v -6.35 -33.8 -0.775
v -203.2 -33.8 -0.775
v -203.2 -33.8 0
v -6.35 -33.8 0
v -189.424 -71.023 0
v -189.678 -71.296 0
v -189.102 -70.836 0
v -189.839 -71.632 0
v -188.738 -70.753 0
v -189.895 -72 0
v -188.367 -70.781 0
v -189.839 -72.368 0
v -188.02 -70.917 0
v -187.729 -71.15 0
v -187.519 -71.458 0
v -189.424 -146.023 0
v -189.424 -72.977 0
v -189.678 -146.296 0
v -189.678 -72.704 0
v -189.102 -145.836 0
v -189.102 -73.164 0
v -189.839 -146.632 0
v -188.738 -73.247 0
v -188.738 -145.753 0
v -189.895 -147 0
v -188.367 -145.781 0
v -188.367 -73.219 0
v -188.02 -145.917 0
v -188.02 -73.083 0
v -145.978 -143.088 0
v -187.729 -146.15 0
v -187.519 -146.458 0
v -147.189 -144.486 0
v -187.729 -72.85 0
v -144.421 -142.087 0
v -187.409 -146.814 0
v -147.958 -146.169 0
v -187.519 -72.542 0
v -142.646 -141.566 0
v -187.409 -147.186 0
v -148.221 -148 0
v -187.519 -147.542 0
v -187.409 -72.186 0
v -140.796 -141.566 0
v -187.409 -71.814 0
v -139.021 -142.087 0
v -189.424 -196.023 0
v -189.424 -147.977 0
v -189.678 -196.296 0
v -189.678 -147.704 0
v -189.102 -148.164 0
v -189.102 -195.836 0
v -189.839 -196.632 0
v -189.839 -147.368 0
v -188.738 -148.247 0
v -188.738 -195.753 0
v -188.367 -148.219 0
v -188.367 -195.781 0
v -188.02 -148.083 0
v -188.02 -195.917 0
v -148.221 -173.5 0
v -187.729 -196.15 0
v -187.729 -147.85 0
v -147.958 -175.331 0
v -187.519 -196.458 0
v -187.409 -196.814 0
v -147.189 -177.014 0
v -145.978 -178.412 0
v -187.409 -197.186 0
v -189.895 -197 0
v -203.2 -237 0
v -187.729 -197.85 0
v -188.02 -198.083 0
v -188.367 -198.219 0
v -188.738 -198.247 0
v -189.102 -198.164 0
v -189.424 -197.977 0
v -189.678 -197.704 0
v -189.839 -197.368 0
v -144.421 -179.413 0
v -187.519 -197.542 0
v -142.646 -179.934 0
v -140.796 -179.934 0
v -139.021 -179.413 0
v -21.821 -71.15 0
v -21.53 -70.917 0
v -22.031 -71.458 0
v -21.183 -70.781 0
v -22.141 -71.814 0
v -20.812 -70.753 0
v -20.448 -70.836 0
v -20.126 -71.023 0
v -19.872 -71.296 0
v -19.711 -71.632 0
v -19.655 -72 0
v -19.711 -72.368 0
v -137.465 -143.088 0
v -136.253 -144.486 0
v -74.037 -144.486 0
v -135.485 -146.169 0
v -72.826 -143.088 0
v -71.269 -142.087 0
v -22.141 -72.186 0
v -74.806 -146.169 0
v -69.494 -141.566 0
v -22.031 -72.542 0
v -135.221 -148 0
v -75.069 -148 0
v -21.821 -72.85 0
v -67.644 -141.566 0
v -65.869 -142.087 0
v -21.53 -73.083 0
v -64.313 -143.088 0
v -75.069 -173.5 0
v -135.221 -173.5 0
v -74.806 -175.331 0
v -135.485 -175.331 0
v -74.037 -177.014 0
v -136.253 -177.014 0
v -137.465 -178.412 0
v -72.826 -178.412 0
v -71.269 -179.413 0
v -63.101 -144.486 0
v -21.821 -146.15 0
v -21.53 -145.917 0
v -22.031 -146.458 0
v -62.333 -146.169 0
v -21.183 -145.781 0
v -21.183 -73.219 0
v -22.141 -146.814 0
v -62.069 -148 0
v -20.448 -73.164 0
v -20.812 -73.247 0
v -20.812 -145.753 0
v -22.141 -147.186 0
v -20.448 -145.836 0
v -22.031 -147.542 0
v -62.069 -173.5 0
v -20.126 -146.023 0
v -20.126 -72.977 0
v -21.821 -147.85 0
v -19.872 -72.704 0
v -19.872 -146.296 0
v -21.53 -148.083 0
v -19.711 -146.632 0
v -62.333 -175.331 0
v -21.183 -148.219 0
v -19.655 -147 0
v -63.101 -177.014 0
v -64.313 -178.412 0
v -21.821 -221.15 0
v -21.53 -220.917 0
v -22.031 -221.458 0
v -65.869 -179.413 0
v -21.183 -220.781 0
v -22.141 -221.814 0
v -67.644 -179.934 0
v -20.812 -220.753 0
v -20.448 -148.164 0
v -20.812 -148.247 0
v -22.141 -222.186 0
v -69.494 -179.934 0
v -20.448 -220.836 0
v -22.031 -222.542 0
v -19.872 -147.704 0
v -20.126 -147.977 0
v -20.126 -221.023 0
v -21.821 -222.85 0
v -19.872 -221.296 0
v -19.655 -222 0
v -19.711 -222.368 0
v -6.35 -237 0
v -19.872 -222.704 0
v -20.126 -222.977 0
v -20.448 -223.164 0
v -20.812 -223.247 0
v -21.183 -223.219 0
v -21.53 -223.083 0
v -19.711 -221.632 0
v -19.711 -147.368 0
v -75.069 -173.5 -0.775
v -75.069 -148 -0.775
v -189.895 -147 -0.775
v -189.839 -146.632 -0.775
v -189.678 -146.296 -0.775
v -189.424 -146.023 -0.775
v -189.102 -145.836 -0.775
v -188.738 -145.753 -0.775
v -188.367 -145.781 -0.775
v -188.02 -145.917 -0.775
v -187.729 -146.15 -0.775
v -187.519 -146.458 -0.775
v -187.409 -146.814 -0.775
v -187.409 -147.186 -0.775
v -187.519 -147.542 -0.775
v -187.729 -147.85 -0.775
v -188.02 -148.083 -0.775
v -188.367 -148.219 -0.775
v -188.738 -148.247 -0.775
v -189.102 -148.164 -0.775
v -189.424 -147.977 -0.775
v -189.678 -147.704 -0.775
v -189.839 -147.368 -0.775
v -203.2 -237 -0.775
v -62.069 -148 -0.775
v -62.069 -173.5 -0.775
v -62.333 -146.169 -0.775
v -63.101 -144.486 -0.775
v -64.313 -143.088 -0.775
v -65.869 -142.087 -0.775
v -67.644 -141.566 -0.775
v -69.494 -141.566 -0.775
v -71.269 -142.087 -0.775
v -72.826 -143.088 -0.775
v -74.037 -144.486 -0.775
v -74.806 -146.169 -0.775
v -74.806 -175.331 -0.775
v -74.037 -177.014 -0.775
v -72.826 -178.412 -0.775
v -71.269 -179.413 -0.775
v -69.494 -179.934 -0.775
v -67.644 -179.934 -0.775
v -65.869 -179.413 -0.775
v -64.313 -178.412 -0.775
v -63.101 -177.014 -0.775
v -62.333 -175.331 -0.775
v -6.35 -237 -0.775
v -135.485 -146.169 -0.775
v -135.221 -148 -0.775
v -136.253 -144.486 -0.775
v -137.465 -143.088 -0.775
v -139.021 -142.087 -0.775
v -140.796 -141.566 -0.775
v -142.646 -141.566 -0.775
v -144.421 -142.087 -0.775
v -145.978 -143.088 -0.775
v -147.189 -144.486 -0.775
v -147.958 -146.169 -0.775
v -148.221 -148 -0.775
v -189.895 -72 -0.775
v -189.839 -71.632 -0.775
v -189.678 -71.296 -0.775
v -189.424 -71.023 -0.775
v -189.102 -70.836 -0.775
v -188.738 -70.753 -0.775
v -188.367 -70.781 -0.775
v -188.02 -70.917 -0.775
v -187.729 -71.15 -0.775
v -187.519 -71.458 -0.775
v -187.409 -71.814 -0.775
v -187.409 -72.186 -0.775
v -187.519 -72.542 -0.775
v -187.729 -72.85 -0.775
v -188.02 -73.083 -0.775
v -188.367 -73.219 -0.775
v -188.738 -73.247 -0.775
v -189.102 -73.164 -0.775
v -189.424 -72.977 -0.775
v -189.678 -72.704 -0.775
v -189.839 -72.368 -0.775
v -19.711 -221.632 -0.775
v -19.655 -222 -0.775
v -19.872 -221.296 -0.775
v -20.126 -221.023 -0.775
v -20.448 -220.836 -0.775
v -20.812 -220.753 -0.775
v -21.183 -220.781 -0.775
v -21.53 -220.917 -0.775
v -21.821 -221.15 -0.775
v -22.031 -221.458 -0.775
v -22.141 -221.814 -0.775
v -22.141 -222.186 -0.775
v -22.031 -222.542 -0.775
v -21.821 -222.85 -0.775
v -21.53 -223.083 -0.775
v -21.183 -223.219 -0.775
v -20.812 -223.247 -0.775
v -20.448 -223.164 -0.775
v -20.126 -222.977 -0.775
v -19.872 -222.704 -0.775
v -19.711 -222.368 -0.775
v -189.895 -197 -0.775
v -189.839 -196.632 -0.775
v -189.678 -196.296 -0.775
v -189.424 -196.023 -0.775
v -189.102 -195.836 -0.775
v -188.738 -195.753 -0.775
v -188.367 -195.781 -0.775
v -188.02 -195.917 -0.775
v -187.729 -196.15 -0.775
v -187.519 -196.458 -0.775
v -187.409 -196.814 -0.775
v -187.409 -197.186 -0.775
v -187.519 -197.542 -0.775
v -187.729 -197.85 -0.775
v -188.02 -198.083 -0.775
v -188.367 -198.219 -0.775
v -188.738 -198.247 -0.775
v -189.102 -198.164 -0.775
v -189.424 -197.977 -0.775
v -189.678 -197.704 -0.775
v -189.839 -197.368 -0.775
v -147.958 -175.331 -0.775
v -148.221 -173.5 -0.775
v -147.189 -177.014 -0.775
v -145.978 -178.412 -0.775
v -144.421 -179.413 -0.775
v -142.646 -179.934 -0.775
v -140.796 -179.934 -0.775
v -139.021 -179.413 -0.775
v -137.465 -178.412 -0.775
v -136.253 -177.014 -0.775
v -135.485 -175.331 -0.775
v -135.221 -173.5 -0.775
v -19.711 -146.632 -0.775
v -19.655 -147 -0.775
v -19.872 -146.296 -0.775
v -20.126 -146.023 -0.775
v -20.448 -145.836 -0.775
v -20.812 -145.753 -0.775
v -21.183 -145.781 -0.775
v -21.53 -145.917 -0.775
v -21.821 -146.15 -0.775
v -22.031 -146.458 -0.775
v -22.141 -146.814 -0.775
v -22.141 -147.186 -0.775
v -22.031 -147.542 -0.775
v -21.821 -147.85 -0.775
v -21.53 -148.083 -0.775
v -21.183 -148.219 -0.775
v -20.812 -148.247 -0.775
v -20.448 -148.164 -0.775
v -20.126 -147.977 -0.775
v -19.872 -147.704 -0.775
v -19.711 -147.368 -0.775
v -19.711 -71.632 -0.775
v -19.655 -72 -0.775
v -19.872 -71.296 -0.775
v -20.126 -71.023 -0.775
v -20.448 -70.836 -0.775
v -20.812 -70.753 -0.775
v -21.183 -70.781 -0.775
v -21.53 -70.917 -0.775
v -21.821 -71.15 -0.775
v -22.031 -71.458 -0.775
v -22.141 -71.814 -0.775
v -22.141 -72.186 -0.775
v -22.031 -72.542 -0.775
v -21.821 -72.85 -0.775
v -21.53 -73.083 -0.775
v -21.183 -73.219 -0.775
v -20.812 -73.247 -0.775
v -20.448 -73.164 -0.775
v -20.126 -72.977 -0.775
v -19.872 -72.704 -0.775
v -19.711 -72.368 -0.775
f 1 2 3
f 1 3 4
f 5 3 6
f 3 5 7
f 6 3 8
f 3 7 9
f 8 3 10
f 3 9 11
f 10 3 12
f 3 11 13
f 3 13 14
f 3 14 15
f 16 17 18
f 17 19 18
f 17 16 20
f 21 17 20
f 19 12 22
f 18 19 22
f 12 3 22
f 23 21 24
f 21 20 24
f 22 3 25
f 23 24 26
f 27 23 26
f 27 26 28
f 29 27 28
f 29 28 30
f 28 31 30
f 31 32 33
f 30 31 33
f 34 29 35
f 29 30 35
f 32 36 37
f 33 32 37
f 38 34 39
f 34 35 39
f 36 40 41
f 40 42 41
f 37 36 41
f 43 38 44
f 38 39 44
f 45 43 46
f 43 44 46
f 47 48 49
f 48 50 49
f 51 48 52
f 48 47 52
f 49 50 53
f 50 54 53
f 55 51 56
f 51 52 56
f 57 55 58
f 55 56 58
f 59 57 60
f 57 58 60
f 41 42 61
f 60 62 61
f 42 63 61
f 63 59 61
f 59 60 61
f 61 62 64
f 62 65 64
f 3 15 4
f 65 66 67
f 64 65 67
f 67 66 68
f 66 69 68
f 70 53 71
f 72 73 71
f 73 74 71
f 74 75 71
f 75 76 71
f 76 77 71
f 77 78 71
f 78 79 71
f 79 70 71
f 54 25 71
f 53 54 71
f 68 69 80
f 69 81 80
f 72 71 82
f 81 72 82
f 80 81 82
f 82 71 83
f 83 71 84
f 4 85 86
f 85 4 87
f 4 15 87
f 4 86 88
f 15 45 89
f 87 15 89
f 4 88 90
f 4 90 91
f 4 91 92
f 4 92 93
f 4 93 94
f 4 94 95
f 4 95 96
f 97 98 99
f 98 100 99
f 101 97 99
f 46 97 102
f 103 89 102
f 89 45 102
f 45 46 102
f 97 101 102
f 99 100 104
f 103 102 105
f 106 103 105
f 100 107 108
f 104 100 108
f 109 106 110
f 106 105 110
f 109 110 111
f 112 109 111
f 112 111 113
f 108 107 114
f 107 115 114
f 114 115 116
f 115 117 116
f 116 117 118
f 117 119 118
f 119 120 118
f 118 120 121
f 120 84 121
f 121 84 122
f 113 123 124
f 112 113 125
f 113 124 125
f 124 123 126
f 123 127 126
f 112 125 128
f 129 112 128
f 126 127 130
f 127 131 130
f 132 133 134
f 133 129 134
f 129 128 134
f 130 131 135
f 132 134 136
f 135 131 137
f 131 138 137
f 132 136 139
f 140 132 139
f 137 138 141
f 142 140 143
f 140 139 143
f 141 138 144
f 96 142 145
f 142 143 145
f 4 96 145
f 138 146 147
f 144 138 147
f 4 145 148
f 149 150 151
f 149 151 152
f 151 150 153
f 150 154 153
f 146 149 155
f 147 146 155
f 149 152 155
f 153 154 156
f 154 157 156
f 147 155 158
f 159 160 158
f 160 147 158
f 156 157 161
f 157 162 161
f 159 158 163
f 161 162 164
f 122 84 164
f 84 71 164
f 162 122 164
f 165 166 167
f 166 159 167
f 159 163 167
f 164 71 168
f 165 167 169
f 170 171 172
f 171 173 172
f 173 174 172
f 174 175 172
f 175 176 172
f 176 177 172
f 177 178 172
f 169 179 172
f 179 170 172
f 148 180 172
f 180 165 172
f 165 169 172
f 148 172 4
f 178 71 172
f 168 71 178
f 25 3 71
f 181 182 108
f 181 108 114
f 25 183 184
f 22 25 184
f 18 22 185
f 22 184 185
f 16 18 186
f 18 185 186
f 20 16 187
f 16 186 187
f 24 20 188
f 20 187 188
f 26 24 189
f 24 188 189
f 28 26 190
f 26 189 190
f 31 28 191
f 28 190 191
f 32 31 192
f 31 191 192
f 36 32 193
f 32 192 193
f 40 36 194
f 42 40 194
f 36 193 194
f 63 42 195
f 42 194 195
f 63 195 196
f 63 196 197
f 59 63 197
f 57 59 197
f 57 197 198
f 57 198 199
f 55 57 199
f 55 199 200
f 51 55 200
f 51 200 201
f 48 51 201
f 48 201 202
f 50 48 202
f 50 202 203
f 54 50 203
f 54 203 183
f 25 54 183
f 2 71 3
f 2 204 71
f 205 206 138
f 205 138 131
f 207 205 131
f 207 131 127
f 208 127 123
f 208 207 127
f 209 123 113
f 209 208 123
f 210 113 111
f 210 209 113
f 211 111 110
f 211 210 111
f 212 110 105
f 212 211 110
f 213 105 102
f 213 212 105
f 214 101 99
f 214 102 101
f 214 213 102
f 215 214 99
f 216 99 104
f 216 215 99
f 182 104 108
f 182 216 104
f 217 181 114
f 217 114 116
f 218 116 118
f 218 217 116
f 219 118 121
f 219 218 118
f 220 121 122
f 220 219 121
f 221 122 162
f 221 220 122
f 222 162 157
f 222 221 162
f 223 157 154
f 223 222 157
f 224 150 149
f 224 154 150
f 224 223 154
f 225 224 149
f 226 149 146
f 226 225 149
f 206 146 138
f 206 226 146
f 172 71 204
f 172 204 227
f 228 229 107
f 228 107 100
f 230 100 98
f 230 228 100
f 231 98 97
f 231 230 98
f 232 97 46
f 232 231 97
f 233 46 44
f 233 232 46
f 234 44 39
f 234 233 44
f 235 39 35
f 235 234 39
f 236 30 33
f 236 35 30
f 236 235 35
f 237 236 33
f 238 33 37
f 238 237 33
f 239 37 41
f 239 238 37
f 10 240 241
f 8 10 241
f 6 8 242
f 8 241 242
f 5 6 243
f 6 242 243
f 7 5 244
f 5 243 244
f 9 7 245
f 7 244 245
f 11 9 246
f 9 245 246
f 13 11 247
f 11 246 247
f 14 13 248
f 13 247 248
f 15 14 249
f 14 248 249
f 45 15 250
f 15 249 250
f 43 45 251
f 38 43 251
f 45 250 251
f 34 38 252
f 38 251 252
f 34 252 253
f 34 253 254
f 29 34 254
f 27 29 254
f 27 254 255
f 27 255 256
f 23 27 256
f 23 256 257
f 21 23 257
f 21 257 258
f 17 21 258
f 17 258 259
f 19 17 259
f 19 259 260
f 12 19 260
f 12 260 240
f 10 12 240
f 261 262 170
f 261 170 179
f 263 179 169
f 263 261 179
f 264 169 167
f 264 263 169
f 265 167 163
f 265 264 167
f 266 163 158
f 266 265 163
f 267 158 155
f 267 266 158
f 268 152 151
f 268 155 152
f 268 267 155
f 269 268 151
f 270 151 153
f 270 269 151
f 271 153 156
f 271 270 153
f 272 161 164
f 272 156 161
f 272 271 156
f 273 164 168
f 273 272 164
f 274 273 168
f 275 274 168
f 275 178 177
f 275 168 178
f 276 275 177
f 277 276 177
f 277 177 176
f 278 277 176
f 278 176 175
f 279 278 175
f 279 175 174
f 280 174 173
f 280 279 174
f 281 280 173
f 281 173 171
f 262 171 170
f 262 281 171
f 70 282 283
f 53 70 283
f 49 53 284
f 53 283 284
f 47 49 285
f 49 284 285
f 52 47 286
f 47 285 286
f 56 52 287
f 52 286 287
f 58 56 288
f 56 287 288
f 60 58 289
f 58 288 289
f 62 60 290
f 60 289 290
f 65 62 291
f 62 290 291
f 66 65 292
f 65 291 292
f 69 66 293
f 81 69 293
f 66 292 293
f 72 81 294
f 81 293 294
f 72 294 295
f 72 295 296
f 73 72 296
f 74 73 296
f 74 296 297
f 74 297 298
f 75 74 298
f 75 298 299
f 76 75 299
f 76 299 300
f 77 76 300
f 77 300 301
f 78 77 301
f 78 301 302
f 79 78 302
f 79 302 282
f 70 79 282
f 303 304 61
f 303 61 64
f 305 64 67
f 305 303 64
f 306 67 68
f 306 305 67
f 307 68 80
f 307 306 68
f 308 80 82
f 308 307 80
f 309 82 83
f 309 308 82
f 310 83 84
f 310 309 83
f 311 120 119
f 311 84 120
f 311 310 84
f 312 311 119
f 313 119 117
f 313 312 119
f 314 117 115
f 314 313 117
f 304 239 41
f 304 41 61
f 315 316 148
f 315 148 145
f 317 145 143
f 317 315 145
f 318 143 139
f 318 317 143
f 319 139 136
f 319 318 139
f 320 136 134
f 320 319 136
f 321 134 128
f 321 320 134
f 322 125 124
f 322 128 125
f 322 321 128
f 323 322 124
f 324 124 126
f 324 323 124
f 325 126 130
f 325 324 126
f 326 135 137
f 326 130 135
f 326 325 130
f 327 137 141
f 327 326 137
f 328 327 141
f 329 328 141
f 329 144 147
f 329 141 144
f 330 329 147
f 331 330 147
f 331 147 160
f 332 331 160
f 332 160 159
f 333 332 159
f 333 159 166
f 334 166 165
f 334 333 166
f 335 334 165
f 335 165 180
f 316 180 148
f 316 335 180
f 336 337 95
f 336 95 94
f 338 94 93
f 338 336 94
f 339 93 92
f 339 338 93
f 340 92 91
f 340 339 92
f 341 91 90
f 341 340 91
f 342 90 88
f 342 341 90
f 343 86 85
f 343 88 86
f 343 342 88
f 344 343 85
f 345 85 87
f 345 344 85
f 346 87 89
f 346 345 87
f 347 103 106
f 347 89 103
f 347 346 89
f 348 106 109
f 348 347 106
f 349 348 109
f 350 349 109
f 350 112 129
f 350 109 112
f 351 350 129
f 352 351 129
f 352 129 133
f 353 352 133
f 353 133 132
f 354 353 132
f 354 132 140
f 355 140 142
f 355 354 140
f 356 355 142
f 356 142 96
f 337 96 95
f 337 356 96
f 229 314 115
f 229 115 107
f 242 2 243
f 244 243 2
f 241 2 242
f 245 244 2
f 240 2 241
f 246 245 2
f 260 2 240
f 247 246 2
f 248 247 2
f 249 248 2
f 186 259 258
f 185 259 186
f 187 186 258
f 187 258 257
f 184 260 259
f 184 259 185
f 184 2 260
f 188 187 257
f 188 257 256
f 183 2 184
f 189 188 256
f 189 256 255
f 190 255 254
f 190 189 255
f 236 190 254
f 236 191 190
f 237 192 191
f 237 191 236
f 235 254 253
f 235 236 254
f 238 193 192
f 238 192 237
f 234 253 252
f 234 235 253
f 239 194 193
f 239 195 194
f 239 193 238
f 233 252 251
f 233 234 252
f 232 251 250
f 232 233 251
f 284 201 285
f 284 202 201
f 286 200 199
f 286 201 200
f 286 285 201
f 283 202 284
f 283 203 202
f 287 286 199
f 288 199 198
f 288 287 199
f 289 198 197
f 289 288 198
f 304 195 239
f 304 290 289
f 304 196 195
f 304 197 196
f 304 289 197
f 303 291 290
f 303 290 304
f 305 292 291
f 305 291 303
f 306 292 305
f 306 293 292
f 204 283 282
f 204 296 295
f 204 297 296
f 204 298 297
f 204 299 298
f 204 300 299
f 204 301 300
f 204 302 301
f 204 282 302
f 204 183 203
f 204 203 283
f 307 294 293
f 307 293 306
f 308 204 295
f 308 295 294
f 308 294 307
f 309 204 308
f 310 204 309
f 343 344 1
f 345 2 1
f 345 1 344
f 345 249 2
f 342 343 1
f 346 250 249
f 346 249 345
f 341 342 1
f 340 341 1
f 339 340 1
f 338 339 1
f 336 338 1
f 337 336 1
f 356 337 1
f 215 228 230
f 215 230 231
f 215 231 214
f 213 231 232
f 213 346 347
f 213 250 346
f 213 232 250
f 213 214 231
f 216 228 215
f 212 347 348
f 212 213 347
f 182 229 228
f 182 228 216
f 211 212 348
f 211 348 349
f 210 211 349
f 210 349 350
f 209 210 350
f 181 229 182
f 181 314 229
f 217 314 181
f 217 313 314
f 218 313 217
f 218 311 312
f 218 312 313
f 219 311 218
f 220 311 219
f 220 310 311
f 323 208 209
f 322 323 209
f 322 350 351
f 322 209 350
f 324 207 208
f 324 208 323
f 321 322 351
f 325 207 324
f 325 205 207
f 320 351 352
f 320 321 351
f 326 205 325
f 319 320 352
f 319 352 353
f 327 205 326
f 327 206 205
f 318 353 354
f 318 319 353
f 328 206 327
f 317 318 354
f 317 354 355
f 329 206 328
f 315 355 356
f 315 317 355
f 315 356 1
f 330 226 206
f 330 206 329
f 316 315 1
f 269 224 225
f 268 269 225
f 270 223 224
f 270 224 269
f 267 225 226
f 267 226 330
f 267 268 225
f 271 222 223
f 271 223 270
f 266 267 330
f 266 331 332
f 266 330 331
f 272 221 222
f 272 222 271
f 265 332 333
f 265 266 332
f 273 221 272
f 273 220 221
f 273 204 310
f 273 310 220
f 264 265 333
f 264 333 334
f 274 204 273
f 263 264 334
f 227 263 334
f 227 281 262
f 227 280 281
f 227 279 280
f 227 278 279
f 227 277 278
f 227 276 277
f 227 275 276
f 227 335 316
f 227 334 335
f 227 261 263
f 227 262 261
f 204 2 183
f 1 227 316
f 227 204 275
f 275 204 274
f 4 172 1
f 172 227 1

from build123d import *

# Parameters (mm, degrees)
SKETCH1_W                             = 196.85
SKETCH1_H                             = 203.2
BOSS_EXTRUDE1_DEPTH                   = 0.7747
CUT_EXTRUDE7_DEPTH                    = 1.7747
SKETCH4_W                             = 196.85
SKETCH4_H                             = 0.6096
BOSS_EXTRUDE2_DEPTH                   = 12
SKETCH14_W                            = 196.85
SKETCH14_H                            = 11.938
BOSS_EXTRUDE3_DEPTH                   = 0.7747
SKETCH13_W                            = 196.85
SKETCH13_H                            = 0.6096
CUT_EXTRUDE9_DEPTH                    = 12
CSK_FOR_M3_FLAT_HEAD_MACHINE_SCREW3_D = 2.5
SKETCH19_W                            = 182.676330849
SKETCH19_H                            = 33.741187375
BOSS_EXTRUDE4_DEPTH                   = 0.7747
SKETCH21_W                            = 22.718000829
SKETCH21_H                            = 22.312299049
SKETCH21_W_2                          = 21.538835619
SKETCH21_H_2                          = 16.643270878
BOSS_EXTRUDE5_DEPTH                   = 0.7747
SKETCH22_W                            = 13.90531837
SKETCH22_H                            = 14.215216999
SKETCH22_W_2                          = 12.509578485
SKETCH22_H_2                          = 9.075576548
BOSS_EXTRUDE6_DEPTH                   = 0.7747


with BuildPart() as part:
    # Sketch1 → Boss-Extrude1 (new body)
    with BuildSketch(Plane(origin=(0, 0, 0), x_dir=(1, 0, 0), z_dir=(0, 0, -1))):
        with Locations((-104.775, 135.4)):
            Rectangle(SKETCH1_W, SKETCH1_H)
    extrude(amount=BOSS_EXTRUDE1_DEPTH)

    # Sketch2 → Cut-Extrude7 (cut, through all)
    with BuildSketch(Plane(origin=(0, 0, -0.7747), x_dir=(1, 0, 0), z_dir=(0, 0, -1))):
        with BuildLine():
            Line((-135.221253236, 173.5), (-135.221253236, 148))
            ThreePointArc((-135.221253236, 148), (-141.721253236, 141.5), (-148.221253236, 148))
            Line((-148.221253236, 148), (-148.221253236, 173.5))
            ThreePointArc((-148.221253236, 173.5), (-141.721253236, 180), (-135.221253236, 173.5))
        make_face()
        with BuildLine():
            Line((-62.069253236, 173.5), (-62.069253236, 148))
            ThreePointArc((-62.069253236, 148), (-68.569253236, 141.5), (-75.069253236, 148))
            Line((-75.069253236, 148), (-75.069253236, 173.5))
            ThreePointArc((-75.069253236, 173.5), (-68.569253236, 180), (-62.069253236, 173.5))
        make_face()
    extrude(amount=-CUT_EXTRUDE7_DEPTH, mode=Mode.SUBTRACT)

    # Sketch4 → Boss-Extrude2 (add)
    with BuildSketch(Plane.XY):
        with Locations((-104.775, -34.1048)):
            Rectangle(SKETCH4_W, SKETCH4_H)
    extrude(amount=BOSS_EXTRUDE2_DEPTH)

    # Sketch14 → Boss-Extrude3 (add)
    with BuildSketch(Plane.XY):
        with Locations((-104.775, -53.935004147)):
            Rectangle(SKETCH14_W, SKETCH14_H)
    extrude(amount=-BOSS_EXTRUDE3_DEPTH)

    # Sketch13 → Cut-Extrude9 (cut)
    with BuildSketch(Plane.XY.offset(12)):
        with Locations((-104.775, -34.1048)):
            Rectangle(SKETCH13_W, SKETCH13_H)
    extrude(amount=-CUT_EXTRUDE9_DEPTH, mode=Mode.SUBTRACT)

    # CSK for M3 Flat Head Machine Screw3 (through all)
    with Locations(Plane.XY):
        with Locations((-188.645, -72), (-188.645, -222), (-188.645, -197), (-188.645, -172), (-188.645, -147), (-188.645, -122), (-188.645, -97)):
            csk_for_m3_flat_head_machine_screw3 = Hole(CSK_FOR_M3_FLAT_HEAD_MACHINE_SCREW3_D / 2)

    # Mirror1: CSK for M3 Flat Head Machine Screw3 across plane
    add(csk_for_m3_flat_head_machine_screw3.mirror(Plane(origin=(-104.775, 0, 0), x_dir=(0, 0, 1), z_dir=(1, 0, 0))), mode=Mode.SUBTRACT)

    # Sketch19 → Boss-Extrude4 (add)
    with BuildSketch(Plane(origin=(0, 0, -0.7747), x_dir=(-1, 0, 0), z_dir=(0, 0, -1))):
        with Locations((101.266706015, -109.837466763)):
            Rectangle(SKETCH19_W, SKETCH19_H)
    extrude(amount=-BOSS_EXTRUDE4_DEPTH)

    # Sketch21 → Boss-Extrude5 (add)
    with BuildSketch(Plane(origin=(0, 0, -0.7747), x_dir=(-1, 0, 0), z_dir=(0, 0, -1))):
        with Locations((185.571692861, -170.919383368)):
            Rectangle(SKETCH21_W, SKETCH21_H)
        with Locations((24.271371833, -173.753897453)):
            Rectangle(SKETCH21_W_2, SKETCH21_H_2)
    extrude(amount=-BOSS_EXTRUDE5_DEPTH)

    # Sketch22 → Boss-Extrude6 (add)
    with BuildSketch(Plane.XY):
        with Locations((-189.313880795, -220.883843828)):
            Rectangle(SKETCH22_W, SKETCH22_H)
        with Locations((-23.670028487, -197.876391374)):
            Rectangle(SKETCH22_W_2, SKETCH22_H_2)
    extrude(amount=-BOSS_EXTRUDE6_DEPTH)


solid = part.part
